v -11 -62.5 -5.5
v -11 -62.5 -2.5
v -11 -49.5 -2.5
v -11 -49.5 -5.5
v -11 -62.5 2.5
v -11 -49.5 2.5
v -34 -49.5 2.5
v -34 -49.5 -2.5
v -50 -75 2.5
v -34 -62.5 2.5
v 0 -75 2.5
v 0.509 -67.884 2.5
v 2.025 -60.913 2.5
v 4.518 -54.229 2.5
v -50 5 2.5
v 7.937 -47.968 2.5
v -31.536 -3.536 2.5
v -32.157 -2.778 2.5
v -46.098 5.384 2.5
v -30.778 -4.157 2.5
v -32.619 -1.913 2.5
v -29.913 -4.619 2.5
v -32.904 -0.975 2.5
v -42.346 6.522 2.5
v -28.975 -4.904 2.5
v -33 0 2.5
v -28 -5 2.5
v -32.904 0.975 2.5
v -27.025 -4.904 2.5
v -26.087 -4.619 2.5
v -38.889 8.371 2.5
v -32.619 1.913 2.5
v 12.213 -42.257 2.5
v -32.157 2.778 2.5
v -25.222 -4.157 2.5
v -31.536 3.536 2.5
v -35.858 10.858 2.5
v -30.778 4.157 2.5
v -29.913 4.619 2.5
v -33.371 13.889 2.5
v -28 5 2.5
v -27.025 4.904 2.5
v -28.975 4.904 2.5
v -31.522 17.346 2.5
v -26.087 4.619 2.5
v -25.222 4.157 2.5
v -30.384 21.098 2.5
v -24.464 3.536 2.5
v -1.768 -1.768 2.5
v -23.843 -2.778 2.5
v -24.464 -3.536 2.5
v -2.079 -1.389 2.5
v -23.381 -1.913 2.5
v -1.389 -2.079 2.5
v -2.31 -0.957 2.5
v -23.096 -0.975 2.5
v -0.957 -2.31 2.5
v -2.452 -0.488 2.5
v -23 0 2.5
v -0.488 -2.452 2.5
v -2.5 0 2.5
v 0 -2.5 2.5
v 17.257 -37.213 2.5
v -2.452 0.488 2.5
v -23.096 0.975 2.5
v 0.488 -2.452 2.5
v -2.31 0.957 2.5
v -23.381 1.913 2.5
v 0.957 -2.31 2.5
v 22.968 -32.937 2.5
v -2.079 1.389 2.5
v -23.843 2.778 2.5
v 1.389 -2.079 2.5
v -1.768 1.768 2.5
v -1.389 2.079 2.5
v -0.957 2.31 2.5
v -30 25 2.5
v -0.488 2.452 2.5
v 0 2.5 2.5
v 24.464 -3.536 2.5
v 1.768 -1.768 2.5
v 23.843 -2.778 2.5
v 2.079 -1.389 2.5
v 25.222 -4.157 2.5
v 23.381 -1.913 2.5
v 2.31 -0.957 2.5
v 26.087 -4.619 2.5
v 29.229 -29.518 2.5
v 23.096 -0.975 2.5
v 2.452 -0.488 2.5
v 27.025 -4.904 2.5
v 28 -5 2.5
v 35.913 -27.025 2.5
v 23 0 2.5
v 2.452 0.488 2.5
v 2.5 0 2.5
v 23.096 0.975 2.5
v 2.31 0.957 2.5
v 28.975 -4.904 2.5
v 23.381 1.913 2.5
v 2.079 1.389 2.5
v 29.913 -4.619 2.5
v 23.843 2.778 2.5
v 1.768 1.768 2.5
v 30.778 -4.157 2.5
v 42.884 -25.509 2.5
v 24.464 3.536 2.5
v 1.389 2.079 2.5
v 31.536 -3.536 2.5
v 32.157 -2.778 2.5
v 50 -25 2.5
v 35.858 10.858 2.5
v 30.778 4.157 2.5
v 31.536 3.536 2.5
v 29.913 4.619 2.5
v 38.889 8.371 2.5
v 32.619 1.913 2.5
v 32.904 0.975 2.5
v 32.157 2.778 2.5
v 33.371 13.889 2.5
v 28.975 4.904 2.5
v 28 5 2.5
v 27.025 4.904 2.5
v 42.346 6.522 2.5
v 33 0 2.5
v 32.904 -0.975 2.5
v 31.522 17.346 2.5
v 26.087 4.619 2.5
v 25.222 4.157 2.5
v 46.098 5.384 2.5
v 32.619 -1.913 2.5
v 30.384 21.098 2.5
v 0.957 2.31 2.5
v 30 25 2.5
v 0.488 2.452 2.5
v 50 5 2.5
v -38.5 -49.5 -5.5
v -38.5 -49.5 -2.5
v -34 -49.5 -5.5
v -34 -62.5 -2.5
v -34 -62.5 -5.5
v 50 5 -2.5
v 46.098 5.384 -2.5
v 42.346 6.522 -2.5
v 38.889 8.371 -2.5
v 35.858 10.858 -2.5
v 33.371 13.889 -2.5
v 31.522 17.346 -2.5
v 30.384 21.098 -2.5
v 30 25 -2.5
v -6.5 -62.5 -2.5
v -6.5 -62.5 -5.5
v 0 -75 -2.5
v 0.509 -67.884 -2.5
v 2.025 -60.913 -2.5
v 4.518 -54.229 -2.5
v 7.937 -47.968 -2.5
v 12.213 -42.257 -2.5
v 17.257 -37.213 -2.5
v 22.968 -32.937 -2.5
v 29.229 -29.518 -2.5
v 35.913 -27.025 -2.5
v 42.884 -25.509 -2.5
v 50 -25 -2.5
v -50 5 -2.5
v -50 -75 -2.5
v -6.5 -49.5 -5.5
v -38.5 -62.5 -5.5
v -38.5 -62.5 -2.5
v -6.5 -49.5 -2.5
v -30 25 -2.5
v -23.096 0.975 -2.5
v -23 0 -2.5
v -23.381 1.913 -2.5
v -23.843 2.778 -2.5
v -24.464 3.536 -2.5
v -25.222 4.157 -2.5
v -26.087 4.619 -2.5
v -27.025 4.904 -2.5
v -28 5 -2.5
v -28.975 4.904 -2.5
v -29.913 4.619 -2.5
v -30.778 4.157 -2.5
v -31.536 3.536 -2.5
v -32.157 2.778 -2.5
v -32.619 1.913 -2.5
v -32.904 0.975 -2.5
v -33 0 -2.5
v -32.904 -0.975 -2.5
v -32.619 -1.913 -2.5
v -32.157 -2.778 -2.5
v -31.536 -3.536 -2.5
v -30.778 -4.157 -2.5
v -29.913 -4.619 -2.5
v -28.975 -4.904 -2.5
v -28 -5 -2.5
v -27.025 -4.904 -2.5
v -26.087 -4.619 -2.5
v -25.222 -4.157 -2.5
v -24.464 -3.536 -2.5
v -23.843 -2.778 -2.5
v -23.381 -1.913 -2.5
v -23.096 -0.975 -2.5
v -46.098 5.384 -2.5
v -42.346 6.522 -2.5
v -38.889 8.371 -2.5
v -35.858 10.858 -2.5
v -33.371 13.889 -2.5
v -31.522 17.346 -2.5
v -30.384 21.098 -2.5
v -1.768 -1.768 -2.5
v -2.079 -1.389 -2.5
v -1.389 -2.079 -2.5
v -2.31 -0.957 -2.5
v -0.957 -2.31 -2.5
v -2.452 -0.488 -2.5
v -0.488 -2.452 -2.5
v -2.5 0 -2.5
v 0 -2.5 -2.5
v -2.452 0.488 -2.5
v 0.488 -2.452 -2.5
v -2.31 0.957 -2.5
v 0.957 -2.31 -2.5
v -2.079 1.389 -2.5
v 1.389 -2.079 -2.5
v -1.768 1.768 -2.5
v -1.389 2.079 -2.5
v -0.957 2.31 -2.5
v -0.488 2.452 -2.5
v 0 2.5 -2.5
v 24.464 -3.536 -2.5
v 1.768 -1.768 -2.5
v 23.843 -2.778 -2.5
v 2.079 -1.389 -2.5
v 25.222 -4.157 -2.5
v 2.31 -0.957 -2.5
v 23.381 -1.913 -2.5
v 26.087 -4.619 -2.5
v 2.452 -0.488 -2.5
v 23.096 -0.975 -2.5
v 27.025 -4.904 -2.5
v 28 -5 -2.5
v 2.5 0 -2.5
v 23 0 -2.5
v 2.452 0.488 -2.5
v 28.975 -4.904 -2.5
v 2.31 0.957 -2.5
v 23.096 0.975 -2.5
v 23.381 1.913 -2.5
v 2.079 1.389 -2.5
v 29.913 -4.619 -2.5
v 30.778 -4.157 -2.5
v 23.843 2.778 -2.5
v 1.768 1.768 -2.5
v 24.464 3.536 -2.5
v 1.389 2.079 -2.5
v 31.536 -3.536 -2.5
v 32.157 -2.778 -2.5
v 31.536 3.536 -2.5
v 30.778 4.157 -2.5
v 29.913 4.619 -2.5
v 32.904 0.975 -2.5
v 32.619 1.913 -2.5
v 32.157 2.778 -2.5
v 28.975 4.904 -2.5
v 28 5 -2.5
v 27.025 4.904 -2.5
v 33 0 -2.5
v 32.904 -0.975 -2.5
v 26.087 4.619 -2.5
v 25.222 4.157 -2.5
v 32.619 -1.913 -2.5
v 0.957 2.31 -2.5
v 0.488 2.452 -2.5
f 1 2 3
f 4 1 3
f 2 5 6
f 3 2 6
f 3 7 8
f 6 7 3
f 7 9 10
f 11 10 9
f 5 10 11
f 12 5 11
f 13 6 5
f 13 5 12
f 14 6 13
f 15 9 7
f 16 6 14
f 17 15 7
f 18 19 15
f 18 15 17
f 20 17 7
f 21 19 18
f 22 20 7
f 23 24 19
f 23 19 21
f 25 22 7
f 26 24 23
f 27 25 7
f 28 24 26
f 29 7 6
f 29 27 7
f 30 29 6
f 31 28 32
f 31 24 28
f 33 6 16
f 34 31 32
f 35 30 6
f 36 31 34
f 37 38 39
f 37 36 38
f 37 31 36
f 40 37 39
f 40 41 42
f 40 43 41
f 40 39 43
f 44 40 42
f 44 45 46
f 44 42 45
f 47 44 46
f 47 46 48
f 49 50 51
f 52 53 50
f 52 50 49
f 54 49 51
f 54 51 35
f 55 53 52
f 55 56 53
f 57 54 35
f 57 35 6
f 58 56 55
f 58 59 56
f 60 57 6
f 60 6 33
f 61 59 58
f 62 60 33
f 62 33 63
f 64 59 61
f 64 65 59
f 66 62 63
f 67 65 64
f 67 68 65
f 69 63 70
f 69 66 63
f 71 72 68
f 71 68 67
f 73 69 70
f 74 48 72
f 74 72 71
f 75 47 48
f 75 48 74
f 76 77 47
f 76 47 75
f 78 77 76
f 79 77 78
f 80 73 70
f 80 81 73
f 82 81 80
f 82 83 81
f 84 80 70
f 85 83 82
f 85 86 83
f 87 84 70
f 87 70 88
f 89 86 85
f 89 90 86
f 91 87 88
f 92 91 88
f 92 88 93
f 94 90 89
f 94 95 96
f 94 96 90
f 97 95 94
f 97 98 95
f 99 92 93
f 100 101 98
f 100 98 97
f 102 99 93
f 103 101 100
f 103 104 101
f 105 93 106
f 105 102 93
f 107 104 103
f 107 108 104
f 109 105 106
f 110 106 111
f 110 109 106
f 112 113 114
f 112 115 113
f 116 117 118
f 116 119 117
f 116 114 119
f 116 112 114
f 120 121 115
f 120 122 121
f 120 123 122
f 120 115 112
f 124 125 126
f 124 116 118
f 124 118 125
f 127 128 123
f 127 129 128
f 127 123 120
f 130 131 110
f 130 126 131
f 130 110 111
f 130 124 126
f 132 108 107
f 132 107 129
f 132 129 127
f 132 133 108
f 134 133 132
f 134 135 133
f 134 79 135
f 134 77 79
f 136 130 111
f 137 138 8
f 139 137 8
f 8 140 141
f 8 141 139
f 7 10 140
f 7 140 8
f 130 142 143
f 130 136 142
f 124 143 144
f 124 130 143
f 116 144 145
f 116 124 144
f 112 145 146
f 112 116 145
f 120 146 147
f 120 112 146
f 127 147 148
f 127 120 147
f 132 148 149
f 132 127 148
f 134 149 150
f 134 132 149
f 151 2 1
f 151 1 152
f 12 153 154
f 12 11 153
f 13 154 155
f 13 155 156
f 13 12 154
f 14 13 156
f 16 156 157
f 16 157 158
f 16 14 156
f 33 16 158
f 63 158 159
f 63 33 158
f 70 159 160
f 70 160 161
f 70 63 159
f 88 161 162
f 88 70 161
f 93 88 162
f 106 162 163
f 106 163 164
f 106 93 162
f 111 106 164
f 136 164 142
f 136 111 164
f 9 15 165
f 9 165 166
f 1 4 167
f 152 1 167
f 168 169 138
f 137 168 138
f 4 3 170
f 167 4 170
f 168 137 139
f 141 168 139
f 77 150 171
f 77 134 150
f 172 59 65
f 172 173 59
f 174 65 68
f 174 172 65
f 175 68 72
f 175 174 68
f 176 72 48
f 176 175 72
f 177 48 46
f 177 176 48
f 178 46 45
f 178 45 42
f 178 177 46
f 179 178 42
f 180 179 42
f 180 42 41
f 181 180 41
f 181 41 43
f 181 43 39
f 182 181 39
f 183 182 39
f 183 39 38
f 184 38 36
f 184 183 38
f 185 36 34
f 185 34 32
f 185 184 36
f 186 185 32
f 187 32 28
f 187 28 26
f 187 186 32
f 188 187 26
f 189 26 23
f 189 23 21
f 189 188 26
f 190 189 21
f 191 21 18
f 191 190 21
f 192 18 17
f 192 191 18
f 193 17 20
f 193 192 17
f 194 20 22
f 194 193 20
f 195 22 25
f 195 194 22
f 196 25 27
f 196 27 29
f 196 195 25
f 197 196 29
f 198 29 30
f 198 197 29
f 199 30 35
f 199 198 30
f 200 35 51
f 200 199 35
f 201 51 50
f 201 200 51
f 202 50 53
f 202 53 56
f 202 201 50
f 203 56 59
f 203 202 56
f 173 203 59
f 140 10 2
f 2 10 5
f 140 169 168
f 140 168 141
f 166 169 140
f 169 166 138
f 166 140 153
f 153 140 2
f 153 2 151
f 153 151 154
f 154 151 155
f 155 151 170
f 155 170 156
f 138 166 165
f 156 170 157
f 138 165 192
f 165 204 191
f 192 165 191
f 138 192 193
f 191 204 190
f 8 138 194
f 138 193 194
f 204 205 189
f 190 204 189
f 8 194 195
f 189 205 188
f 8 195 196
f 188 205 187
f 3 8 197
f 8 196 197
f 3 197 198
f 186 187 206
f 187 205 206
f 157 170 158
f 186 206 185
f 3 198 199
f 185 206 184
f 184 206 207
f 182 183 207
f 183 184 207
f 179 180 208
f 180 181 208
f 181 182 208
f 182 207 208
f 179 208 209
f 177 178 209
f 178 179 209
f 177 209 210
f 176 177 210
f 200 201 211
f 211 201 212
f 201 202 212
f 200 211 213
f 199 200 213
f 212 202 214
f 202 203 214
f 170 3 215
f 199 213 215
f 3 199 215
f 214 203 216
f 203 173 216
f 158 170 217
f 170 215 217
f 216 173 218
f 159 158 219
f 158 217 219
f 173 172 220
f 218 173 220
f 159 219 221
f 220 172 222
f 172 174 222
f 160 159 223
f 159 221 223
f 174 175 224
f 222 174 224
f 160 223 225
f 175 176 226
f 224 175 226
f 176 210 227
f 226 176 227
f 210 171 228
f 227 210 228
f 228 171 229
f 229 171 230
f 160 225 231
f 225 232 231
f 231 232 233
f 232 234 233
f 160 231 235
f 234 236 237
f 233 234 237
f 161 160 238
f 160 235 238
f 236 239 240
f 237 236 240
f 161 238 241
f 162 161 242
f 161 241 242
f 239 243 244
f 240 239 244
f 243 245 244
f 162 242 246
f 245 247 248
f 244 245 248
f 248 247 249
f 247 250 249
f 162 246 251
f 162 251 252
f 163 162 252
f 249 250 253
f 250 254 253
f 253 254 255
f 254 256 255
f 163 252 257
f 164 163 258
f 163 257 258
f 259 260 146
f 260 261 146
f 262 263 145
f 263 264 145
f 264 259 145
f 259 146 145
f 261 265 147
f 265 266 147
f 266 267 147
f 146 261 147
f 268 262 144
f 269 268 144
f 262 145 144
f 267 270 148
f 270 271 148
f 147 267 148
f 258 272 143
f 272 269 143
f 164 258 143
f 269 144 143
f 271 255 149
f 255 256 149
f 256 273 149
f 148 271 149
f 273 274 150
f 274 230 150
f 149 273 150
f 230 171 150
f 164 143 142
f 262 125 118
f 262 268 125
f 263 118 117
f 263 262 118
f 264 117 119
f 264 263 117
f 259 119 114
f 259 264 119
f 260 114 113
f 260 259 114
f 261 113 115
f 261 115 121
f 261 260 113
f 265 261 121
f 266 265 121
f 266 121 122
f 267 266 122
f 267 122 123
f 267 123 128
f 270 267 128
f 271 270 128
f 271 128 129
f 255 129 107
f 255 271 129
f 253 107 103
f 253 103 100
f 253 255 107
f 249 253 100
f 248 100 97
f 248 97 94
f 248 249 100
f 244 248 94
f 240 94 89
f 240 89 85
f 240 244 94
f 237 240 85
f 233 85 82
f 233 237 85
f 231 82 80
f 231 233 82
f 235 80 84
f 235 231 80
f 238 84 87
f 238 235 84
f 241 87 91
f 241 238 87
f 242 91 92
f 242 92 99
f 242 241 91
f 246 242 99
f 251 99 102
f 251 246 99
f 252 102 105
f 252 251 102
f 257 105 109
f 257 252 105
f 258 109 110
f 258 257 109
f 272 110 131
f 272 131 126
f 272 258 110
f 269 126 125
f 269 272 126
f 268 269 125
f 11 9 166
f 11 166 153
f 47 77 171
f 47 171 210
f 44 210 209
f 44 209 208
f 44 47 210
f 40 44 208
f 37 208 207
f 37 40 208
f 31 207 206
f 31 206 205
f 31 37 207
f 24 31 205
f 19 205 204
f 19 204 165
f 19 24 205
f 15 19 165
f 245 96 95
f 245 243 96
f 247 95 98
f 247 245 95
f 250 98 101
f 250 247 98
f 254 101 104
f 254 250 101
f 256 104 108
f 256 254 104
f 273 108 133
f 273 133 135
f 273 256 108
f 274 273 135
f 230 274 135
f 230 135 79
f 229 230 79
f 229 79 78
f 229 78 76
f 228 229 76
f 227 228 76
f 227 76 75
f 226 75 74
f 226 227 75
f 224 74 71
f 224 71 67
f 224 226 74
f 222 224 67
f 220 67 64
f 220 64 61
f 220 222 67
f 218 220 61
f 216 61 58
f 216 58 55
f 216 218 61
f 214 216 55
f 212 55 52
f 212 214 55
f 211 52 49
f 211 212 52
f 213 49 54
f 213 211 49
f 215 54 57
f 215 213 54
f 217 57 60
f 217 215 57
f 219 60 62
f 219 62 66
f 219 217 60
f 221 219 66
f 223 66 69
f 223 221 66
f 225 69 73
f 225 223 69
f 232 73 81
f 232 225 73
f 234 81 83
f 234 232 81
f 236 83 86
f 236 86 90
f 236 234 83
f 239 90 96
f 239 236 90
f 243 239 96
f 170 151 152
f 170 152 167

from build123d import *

# Parameters (mm, degrees)
CROQUIS1_R              = 2.5
CROQUIS1_R_2            = 5
CROQUIS1_W              = 23
CROQUIS1_H              = 13
SALIENTE_EXTRUIR1_DEPTH = 2.5
CROQUIS2_W              = 4.5
CROQUIS2_H              = 13
SALIENTE_EXTRUIR2_DEPTH = 8


with BuildPart() as part:
    # Croquis1 → Saliente-Extruir1 (new body, symmetric)
    with BuildSketch(Plane.XY):
        with BuildLine():
            Line((30, 25), (-30, 25))
            ThreePointArc((-30, 25), (-35.857864376, 10.857864376), (-50, 5))
            Line((-50, 5), (-50, -75))
            Line((-50, -75), (0, -75))
            ThreePointArc((0, -75), (14.644660941, -39.644660941), (50, -25))
            Line((50, -25), (50, 5))
            ThreePointArc((50, 5), (35.857864376, 10.857864376), (30, 25))
        make_face()
        Circle(CROQUIS1_R, mode=Mode.SUBTRACT)
        with Locations((-28, 0)):
            Circle(CROQUIS1_R_2, mode=Mode.SUBTRACT)
        with Locations((28, 0)):
            Circle(CROQUIS1_R_2, mode=Mode.SUBTRACT)
        with Locations((-22.5, -56)):
            Rectangle(CROQUIS1_W, CROQUIS1_H, mode=Mode.SUBTRACT)
    extrude(amount=SALIENTE_EXTRUIR1_DEPTH, both=True)

    # Croquis2 → Saliente-Extruir2 (add)
    with BuildSketch(Plane.XY.offset(2.5)):
        with Locations((-36.25, -56)):
            Rectangle(CROQUIS2_W, CROQUIS2_H)
        with Locations((-8.75, -56)):
            Rectangle(CROQUIS2_W, CROQUIS2_H)
    extrude(amount=-SALIENTE_EXTRUIR2_DEPTH)


solid = part.part
